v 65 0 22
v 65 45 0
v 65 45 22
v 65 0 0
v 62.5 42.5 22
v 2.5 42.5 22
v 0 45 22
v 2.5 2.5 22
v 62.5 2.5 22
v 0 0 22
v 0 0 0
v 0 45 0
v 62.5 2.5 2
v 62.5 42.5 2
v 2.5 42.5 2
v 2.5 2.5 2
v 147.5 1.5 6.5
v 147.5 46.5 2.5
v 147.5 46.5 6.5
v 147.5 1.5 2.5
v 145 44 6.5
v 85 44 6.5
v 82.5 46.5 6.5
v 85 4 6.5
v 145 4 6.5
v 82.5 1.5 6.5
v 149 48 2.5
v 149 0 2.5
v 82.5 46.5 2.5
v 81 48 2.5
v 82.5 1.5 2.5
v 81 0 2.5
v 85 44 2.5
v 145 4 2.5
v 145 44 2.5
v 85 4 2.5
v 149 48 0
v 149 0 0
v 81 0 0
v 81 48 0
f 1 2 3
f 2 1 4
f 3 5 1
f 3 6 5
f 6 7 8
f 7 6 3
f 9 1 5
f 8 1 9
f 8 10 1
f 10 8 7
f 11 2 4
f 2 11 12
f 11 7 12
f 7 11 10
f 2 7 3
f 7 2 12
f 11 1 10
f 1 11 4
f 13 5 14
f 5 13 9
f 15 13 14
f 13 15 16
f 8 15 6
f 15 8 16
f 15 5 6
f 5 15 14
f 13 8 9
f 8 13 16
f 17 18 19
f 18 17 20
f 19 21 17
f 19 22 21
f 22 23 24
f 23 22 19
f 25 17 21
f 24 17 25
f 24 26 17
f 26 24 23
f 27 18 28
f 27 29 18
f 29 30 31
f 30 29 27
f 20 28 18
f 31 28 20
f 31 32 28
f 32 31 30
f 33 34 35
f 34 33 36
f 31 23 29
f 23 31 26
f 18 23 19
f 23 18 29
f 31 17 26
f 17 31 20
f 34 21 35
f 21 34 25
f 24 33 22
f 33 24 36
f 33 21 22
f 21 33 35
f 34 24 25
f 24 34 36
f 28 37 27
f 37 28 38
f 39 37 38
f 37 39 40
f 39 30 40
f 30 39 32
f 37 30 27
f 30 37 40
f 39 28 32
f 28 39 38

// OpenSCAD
// snap-fit-lid.scad
// 入门级示例: 扣合式盒子和盖子
// 演示公差设计 + 凹凸配合结构

/* [Box Dimensions] */
box_w = 60;            // 盒内宽 (mm)
box_d = 40;            // 盒内深 (mm)
box_inner_h = 20;      // 盒内高 (mm)
wall_t = 2.5;          // 壁厚 (mm)
floor_t = 2;           // 底厚 (mm)

/* [Tolerance] */
fit_clearance = 0.2;   // 盖子与盒体的配合间隙 (mm)
snap_w = 4;            // 卡扣宽度 (mm)
snap_d = 1;            // 卡扣突出量 (mm)

/* [Quality] */
$fn = 64;


module box_body() {
    // 盒子主体: difference 掏空
    outer_w = box_w + 2 * wall_t;
    outer_d = box_d + 2 * wall_t;
    outer_h = box_inner_h + floor_t;

    difference() {
        // 外轮廓
        cube([outer_w, outer_d, outer_h]);

        // 掏空内部
        translate([wall_t, wall_t, floor_t])
            cube([box_w, box_d, box_inner_h + 1]);
    }
}

module box_lid() {
    // 盖子: 倒扣结构 + 侧壁
    outer_w = box_w + 2 * wall_t;
    outer_d = box_d + 2 * wall_t;
    lid_h = 4;

    union() {
        // 盖顶板
        cube([outer_w + 2 * snap_d + 1,
              outer_d + 2 * snap_d + 1,
              wall_t]);

        // 侧壁 (外尺寸匹配盒子外尺寸)
        difference() {
            translate([snap_d + 0.5, snap_d + 0.5, wall_t])
                cube([outer_w, outer_d, lid_h]);

            // 掏空侧壁内部 (留壁厚)
            translate([snap_d + 0.5 + wall_t,
                       snap_d + 0.5 + wall_t,
                       wall_t - 0.5])
                cube([outer_w - 2 * wall_t,
                      outer_d - 2 * wall_t,
                      lid_h + 1]);
        }
    }
}


module main() {
    // 并排显示盒子 (左) 和盖子 (右)
    box_body();
    translate([box_w + 2 * wall_t + snap_d + 15, 0, 0])
        box_lid();
}

main();

// 导出单个零件:
// 盒子:  openscad snap-fit-lid.scad -o box.stl
//         (在 main 中只保留 box_body 调用)
//
// 盖子:  openscad snap-fit-lid.scad -o lid.stl
//         (在 main 中只保留 box_lid 调用)
